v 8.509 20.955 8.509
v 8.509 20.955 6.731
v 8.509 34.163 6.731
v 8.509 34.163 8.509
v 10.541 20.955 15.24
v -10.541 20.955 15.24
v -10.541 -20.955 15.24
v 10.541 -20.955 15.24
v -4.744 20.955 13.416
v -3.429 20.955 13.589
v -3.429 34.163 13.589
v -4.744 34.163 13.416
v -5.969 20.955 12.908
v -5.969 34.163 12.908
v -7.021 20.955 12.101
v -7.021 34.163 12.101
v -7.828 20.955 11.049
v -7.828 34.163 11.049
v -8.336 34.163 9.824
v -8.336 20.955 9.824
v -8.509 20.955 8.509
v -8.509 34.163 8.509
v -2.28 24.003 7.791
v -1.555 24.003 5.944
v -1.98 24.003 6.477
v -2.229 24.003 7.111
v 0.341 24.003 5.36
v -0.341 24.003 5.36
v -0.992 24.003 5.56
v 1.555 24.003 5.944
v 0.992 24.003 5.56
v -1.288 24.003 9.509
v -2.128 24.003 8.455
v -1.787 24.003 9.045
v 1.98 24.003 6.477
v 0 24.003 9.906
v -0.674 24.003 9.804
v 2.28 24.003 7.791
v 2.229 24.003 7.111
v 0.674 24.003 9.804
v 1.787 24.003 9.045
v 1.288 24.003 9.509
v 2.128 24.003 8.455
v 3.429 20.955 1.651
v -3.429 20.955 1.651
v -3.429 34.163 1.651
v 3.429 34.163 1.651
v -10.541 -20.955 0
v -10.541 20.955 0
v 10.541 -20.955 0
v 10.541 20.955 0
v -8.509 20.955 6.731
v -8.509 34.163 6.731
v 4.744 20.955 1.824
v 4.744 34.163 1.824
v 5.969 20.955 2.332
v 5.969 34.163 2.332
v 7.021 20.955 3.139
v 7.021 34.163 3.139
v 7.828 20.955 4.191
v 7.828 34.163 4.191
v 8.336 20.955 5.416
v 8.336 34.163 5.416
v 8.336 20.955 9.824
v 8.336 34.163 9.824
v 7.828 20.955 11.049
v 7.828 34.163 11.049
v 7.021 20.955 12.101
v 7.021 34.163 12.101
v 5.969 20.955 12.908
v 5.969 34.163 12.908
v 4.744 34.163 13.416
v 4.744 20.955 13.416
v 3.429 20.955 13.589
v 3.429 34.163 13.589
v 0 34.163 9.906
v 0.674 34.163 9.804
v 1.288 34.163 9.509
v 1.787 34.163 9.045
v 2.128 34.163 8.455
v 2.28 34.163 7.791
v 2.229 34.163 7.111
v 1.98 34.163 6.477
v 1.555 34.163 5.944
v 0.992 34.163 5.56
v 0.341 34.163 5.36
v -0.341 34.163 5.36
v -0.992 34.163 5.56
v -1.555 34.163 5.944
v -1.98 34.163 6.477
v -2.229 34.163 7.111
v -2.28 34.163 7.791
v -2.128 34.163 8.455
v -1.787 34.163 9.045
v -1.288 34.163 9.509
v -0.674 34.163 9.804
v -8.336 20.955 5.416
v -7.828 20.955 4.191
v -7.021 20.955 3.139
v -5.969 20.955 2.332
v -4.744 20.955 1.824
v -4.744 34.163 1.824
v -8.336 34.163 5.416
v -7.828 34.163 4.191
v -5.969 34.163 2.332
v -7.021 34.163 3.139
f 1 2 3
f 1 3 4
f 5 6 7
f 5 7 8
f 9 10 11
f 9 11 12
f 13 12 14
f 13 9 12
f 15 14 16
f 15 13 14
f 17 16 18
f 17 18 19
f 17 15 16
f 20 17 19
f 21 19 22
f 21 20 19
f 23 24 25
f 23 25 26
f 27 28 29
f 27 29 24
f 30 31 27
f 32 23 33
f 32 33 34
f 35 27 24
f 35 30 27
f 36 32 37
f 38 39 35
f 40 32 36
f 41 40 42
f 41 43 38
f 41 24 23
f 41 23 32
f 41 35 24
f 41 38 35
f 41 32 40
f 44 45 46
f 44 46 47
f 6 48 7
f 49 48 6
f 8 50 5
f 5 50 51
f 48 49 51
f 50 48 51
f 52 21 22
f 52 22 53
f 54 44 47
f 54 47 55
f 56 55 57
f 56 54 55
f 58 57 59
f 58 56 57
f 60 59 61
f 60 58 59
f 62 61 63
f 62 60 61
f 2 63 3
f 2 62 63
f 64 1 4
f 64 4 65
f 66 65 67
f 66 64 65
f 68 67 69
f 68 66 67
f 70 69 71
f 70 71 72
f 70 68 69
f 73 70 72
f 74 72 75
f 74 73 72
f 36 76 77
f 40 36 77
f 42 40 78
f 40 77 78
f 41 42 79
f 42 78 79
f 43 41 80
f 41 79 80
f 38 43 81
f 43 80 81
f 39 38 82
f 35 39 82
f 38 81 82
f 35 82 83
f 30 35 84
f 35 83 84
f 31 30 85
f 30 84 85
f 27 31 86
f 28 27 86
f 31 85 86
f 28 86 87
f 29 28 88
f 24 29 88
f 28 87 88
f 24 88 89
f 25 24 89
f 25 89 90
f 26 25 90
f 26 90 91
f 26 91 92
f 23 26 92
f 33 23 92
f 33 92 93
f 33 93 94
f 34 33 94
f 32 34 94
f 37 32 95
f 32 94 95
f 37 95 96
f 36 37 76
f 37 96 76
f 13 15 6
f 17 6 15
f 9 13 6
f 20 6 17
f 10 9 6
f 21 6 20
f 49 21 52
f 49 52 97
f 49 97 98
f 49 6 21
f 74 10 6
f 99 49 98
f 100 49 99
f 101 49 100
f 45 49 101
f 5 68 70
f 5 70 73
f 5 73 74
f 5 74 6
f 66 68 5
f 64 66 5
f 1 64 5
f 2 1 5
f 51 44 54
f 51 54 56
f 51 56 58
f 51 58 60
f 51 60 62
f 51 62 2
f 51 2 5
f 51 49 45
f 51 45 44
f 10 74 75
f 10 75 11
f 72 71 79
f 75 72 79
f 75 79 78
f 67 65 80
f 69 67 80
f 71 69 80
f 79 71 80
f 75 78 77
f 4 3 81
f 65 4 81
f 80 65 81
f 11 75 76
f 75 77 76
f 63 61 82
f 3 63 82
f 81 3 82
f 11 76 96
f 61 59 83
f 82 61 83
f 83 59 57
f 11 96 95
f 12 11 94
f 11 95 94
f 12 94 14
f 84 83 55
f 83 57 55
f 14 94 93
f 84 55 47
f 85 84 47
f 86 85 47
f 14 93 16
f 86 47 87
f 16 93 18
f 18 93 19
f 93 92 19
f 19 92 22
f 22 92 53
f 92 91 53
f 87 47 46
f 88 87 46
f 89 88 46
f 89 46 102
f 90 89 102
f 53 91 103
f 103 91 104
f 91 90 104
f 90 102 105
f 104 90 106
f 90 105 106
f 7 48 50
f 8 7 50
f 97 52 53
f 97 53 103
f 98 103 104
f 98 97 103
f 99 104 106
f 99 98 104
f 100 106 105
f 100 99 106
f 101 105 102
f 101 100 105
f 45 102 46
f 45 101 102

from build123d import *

# Parameters (mm, degrees)
SKETCH1_W           = 21.082
SKETCH1_H           = 41.91
BOSS_EXTRUDE1_DEPTH = 15.24
BOSS_EXTRUDE2_DEPTH = 13.208
SKETCH3_R           = 2.286
CUT_EXTRUDE1_DEPTH  = 10.16


with BuildPart() as part:
    # Sketch1 → Boss-Extrude1 (new body)
    with BuildSketch(Plane.XY):
        Rectangle(SKETCH1_W, SKETCH1_H)
    extrude(amount=BOSS_EXTRUDE1_DEPTH)

    # Sketch2 → Boss-Extrude2 (add)
    with BuildSketch(Plane(origin=(0, 20.955, 0), x_dir=(1, 0, 0), z_dir=(0, 1, 0))):
        with BuildLine():
            Line((3.429, -13.589), (-3.429, -13.589))
            ThreePointArc((-3.429, -13.589), (-7.021102448, -12.101102448), (-8.509, -8.509))
            Line((-8.509, -8.509), (-8.509, -6.731))
            ThreePointArc((-8.509, -6.731), (-7.021102448, -3.138897552), (-3.429, -1.651))
            Line((-3.429, -1.651), (3.429, -1.651))
            ThreePointArc((3.429, -1.651), (7.021102448, -3.138897552), (8.509, -6.731))
            Line((8.509, -6.731), (8.509, -8.509))
            ThreePointArc((8.509, -8.509), (7.021102448, -12.101102448), (3.429, -13.589))
        make_face()
    extrude(amount=BOSS_EXTRUDE2_DEPTH)

    # Sketch3 → Cut-Extrude1 (cut)
    with BuildSketch(Plane(origin=(0, 34.163, 0), x_dir=(1, 0, 0), z_dir=(0, 1, 0))):
        with Locations(Location((0, -7.62, 0), (0, 0, 270))):
            Circle(SKETCH3_R)
    extrude(amount=-CUT_EXTRUDE1_DEPTH, mode=Mode.SUBTRACT)


solid = part.part
